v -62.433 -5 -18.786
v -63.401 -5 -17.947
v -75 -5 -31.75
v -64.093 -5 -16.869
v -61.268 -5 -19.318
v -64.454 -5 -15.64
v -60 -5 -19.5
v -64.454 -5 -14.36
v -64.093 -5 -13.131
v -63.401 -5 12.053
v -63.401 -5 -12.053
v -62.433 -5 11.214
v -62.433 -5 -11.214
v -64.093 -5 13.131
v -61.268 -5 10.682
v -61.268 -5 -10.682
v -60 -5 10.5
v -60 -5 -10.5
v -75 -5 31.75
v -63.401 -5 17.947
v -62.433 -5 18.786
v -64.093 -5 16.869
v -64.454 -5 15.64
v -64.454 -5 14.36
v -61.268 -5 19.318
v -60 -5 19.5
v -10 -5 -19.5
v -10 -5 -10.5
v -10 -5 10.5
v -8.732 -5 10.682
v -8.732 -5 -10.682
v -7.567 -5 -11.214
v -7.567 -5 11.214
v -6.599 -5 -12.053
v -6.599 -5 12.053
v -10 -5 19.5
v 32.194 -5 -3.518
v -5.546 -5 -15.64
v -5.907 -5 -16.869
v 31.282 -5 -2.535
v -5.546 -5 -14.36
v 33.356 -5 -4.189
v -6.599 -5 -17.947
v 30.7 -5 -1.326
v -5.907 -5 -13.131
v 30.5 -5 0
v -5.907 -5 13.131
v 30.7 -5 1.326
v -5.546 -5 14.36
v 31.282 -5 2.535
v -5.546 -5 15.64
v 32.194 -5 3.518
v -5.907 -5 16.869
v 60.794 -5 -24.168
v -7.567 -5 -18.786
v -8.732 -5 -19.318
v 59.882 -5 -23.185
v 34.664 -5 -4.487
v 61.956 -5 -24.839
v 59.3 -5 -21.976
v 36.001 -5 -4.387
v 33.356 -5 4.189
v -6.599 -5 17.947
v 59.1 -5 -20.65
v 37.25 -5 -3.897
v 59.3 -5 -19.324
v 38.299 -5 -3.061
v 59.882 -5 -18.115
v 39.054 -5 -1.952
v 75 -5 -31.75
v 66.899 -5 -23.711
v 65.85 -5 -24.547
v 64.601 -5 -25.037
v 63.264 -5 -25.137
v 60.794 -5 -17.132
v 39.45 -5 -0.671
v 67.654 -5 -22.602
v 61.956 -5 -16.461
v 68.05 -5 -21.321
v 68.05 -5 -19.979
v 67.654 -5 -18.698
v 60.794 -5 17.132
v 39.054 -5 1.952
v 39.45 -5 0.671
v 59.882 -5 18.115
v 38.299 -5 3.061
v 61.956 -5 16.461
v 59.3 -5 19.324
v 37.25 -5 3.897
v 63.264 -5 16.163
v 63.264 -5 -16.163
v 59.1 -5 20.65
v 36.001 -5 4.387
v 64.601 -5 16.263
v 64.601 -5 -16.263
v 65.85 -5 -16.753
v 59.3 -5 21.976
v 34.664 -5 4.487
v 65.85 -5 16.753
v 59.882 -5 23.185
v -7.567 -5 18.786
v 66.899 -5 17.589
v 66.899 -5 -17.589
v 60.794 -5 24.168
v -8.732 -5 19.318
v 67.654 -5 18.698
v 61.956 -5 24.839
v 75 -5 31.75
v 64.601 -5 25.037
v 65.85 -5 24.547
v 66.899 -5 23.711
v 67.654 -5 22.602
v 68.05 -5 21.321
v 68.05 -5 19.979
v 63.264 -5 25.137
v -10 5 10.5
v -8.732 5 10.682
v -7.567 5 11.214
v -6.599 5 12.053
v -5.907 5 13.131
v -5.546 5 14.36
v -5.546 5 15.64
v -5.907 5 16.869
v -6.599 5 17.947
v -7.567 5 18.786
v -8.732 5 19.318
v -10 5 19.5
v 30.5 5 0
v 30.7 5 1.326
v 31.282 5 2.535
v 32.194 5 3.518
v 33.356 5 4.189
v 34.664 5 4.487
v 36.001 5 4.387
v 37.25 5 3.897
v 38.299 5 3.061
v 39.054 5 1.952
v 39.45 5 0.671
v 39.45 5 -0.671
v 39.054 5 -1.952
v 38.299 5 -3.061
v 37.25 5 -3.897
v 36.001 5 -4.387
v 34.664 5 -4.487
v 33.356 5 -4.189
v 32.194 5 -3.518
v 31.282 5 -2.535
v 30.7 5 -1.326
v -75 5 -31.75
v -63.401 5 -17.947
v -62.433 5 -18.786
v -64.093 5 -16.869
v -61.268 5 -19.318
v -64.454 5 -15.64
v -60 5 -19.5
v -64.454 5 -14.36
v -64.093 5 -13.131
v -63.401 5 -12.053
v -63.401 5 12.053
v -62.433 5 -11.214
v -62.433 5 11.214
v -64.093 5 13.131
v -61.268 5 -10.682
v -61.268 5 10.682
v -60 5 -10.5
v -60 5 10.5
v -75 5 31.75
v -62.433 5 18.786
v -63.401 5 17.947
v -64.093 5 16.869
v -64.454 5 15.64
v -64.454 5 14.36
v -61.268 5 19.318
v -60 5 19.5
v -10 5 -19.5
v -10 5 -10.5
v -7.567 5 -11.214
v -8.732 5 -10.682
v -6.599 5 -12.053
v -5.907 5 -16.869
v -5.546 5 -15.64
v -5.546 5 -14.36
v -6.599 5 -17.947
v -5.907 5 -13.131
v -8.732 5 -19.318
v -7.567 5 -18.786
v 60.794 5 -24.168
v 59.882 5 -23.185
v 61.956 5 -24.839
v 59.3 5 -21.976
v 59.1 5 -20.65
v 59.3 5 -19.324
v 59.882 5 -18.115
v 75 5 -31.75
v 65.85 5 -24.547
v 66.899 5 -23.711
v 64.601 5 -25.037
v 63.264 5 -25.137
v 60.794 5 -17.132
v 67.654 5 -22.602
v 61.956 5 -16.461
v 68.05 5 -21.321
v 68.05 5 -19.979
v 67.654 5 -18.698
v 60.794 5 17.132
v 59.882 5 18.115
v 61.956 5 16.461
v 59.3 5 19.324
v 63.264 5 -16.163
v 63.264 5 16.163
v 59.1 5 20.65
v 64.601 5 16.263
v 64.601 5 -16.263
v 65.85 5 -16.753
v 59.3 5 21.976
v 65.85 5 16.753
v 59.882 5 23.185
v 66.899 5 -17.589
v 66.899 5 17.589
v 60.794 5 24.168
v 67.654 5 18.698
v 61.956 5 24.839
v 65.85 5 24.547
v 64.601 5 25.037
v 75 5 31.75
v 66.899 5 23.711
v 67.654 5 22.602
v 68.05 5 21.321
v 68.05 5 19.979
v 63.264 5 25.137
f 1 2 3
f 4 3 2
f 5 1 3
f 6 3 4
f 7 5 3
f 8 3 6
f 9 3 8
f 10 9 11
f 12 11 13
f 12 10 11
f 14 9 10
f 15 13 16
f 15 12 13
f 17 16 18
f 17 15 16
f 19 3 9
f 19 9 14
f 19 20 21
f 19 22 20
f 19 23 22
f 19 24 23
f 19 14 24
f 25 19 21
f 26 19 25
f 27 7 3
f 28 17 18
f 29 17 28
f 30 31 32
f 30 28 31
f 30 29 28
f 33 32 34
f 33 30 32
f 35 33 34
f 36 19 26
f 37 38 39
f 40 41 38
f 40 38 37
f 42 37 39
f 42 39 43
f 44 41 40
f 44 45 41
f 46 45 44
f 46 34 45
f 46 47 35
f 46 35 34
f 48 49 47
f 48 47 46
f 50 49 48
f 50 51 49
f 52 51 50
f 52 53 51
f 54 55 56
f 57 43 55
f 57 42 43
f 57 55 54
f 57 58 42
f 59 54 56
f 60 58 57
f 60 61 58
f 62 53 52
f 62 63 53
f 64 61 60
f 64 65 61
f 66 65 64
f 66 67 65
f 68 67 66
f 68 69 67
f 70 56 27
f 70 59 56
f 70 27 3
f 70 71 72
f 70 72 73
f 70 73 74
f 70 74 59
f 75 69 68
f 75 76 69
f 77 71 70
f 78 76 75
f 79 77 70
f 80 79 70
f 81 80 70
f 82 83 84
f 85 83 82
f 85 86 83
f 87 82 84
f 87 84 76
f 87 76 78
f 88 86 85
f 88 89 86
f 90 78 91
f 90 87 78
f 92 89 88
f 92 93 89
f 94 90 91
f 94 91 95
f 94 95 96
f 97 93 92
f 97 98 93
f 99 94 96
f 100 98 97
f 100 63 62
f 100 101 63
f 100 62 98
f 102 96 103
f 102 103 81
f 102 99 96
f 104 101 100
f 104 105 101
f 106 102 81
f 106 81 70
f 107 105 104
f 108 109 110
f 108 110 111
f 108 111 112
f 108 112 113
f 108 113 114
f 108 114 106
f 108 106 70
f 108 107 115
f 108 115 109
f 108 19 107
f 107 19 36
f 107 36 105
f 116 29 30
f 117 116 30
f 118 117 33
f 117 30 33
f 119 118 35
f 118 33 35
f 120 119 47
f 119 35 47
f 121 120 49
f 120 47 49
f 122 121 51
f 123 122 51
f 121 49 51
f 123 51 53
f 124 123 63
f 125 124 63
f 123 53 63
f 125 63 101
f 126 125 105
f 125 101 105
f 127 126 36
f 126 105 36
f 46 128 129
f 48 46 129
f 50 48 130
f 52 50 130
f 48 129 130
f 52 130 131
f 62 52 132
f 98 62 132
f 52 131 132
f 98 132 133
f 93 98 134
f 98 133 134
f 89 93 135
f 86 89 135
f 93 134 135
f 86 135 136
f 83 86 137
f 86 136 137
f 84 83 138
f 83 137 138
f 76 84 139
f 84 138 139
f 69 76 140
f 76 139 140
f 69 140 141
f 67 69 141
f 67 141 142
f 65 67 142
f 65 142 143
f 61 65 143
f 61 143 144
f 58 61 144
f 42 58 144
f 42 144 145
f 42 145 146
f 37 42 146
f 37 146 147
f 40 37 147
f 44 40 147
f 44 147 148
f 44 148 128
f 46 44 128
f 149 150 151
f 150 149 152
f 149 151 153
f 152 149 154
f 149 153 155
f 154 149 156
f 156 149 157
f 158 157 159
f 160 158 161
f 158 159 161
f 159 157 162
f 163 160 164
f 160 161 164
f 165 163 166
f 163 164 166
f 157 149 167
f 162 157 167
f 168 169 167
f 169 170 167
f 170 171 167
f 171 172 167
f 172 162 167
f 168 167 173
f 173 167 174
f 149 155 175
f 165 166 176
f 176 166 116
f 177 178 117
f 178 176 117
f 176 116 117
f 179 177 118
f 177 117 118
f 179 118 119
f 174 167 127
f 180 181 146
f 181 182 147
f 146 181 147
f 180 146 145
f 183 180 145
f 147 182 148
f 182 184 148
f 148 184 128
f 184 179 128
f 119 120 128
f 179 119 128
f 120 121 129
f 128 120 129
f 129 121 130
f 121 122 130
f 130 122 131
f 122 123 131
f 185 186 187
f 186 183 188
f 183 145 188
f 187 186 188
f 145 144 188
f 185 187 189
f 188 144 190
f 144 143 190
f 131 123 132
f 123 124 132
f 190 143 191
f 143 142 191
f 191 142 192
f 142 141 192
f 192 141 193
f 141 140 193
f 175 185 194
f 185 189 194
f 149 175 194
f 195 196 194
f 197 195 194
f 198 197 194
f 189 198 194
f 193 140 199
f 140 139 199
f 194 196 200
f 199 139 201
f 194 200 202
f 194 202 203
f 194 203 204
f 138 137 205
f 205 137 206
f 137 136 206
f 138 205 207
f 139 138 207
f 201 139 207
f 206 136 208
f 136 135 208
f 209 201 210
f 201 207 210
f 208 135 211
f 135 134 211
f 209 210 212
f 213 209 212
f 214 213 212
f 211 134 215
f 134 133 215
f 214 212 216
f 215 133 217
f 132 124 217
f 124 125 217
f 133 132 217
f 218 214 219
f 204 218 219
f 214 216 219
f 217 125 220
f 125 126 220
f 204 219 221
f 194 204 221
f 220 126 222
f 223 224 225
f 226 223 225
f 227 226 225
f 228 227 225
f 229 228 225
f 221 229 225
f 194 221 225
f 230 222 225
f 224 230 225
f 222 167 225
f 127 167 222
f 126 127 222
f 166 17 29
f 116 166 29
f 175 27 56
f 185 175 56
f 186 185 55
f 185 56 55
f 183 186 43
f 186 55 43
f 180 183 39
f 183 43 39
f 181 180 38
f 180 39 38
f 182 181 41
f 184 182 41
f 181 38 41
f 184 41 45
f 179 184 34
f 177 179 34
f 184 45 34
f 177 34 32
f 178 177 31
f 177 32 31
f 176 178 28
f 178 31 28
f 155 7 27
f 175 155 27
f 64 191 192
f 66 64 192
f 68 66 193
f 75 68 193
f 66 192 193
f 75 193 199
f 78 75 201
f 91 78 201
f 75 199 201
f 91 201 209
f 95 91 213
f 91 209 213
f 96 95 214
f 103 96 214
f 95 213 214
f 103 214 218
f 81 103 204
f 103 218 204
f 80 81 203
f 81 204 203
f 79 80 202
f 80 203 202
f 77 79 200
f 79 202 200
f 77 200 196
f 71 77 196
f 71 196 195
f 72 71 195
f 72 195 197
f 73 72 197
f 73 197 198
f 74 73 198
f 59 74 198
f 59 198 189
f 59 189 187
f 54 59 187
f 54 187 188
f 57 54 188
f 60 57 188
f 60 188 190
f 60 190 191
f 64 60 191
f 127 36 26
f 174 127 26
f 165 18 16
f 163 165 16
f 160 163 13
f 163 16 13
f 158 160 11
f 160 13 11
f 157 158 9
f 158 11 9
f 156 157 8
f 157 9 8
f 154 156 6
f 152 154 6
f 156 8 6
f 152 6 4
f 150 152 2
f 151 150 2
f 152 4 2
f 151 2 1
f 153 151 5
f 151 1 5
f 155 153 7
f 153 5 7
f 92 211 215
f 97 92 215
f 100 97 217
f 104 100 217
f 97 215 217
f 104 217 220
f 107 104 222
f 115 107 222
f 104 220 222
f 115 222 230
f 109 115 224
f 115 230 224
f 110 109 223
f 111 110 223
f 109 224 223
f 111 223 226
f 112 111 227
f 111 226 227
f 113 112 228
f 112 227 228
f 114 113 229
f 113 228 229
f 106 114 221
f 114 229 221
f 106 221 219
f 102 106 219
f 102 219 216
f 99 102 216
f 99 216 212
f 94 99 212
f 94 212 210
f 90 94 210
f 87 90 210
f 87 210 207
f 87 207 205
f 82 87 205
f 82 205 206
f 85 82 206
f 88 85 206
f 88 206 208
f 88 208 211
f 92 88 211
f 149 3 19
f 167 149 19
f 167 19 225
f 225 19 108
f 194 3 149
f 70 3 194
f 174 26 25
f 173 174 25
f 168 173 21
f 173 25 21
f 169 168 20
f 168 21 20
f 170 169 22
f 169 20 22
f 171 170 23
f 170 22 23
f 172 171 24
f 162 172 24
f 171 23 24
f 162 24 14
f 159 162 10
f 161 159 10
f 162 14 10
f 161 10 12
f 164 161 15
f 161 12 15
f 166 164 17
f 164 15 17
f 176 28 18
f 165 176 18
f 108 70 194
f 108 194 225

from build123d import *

# Parameters (mm, degrees)
F0_W     = 150
F0_H     = 63.5
F1_DEPTH = 5
F3_DEPTH = 10.001
F5_D     = 9
F5_DEPTH = 18
F5_TIP   = 2.7038727856


with BuildPart() as f1:
    # F0 (on Front) → F1 (new body, symmetric)
    with BuildSketch(Plane.XZ):
        Rectangle(F0_W, F0_H)
    extrude(amount=F1_DEPTH, both=True)

    # F2 (on face) → F3 (cut, through all)
    with BuildSketch(Plane.XZ.offset(5)):
        with BuildLine():
            ThreePointArc((-60, 19.5), (-64.5, 15), (-60, 10.5))
            Line((-60, 10.5), (-10, 10.5))
            ThreePointArc((-10, 10.5), (-5.5, 15), (-10, 19.5))
            Line((-10, 19.5), (-60, 19.5))
        make_face()
        with BuildLine():
            ThreePointArc((-60, -10.5), (-64.5, -15), (-60, -19.5))
            Line((-60, -19.5), (-10, -19.5))
            ThreePointArc((-10, -19.5), (-5.5, -15), (-10, -10.5))
            Line((-10, -10.5), (-60, -10.5))
        make_face()
    extrude(amount=-F3_DEPTH, mode=Mode.SUBTRACT)

    # F5
    with Locations(Plane.XZ.offset(5)):
        with Locations((35, 0), (63.6, 20.65), (63.6, -20.65)):
            Hole(F5_D / 2, depth=F5_DEPTH)
            with Locations((0, 0, -(F5_DEPTH + F5_TIP / 2))):  # 118° drill point
                Cone(0, F5_D / 2, F5_TIP, mode=Mode.SUBTRACT)


solid = f1.part
